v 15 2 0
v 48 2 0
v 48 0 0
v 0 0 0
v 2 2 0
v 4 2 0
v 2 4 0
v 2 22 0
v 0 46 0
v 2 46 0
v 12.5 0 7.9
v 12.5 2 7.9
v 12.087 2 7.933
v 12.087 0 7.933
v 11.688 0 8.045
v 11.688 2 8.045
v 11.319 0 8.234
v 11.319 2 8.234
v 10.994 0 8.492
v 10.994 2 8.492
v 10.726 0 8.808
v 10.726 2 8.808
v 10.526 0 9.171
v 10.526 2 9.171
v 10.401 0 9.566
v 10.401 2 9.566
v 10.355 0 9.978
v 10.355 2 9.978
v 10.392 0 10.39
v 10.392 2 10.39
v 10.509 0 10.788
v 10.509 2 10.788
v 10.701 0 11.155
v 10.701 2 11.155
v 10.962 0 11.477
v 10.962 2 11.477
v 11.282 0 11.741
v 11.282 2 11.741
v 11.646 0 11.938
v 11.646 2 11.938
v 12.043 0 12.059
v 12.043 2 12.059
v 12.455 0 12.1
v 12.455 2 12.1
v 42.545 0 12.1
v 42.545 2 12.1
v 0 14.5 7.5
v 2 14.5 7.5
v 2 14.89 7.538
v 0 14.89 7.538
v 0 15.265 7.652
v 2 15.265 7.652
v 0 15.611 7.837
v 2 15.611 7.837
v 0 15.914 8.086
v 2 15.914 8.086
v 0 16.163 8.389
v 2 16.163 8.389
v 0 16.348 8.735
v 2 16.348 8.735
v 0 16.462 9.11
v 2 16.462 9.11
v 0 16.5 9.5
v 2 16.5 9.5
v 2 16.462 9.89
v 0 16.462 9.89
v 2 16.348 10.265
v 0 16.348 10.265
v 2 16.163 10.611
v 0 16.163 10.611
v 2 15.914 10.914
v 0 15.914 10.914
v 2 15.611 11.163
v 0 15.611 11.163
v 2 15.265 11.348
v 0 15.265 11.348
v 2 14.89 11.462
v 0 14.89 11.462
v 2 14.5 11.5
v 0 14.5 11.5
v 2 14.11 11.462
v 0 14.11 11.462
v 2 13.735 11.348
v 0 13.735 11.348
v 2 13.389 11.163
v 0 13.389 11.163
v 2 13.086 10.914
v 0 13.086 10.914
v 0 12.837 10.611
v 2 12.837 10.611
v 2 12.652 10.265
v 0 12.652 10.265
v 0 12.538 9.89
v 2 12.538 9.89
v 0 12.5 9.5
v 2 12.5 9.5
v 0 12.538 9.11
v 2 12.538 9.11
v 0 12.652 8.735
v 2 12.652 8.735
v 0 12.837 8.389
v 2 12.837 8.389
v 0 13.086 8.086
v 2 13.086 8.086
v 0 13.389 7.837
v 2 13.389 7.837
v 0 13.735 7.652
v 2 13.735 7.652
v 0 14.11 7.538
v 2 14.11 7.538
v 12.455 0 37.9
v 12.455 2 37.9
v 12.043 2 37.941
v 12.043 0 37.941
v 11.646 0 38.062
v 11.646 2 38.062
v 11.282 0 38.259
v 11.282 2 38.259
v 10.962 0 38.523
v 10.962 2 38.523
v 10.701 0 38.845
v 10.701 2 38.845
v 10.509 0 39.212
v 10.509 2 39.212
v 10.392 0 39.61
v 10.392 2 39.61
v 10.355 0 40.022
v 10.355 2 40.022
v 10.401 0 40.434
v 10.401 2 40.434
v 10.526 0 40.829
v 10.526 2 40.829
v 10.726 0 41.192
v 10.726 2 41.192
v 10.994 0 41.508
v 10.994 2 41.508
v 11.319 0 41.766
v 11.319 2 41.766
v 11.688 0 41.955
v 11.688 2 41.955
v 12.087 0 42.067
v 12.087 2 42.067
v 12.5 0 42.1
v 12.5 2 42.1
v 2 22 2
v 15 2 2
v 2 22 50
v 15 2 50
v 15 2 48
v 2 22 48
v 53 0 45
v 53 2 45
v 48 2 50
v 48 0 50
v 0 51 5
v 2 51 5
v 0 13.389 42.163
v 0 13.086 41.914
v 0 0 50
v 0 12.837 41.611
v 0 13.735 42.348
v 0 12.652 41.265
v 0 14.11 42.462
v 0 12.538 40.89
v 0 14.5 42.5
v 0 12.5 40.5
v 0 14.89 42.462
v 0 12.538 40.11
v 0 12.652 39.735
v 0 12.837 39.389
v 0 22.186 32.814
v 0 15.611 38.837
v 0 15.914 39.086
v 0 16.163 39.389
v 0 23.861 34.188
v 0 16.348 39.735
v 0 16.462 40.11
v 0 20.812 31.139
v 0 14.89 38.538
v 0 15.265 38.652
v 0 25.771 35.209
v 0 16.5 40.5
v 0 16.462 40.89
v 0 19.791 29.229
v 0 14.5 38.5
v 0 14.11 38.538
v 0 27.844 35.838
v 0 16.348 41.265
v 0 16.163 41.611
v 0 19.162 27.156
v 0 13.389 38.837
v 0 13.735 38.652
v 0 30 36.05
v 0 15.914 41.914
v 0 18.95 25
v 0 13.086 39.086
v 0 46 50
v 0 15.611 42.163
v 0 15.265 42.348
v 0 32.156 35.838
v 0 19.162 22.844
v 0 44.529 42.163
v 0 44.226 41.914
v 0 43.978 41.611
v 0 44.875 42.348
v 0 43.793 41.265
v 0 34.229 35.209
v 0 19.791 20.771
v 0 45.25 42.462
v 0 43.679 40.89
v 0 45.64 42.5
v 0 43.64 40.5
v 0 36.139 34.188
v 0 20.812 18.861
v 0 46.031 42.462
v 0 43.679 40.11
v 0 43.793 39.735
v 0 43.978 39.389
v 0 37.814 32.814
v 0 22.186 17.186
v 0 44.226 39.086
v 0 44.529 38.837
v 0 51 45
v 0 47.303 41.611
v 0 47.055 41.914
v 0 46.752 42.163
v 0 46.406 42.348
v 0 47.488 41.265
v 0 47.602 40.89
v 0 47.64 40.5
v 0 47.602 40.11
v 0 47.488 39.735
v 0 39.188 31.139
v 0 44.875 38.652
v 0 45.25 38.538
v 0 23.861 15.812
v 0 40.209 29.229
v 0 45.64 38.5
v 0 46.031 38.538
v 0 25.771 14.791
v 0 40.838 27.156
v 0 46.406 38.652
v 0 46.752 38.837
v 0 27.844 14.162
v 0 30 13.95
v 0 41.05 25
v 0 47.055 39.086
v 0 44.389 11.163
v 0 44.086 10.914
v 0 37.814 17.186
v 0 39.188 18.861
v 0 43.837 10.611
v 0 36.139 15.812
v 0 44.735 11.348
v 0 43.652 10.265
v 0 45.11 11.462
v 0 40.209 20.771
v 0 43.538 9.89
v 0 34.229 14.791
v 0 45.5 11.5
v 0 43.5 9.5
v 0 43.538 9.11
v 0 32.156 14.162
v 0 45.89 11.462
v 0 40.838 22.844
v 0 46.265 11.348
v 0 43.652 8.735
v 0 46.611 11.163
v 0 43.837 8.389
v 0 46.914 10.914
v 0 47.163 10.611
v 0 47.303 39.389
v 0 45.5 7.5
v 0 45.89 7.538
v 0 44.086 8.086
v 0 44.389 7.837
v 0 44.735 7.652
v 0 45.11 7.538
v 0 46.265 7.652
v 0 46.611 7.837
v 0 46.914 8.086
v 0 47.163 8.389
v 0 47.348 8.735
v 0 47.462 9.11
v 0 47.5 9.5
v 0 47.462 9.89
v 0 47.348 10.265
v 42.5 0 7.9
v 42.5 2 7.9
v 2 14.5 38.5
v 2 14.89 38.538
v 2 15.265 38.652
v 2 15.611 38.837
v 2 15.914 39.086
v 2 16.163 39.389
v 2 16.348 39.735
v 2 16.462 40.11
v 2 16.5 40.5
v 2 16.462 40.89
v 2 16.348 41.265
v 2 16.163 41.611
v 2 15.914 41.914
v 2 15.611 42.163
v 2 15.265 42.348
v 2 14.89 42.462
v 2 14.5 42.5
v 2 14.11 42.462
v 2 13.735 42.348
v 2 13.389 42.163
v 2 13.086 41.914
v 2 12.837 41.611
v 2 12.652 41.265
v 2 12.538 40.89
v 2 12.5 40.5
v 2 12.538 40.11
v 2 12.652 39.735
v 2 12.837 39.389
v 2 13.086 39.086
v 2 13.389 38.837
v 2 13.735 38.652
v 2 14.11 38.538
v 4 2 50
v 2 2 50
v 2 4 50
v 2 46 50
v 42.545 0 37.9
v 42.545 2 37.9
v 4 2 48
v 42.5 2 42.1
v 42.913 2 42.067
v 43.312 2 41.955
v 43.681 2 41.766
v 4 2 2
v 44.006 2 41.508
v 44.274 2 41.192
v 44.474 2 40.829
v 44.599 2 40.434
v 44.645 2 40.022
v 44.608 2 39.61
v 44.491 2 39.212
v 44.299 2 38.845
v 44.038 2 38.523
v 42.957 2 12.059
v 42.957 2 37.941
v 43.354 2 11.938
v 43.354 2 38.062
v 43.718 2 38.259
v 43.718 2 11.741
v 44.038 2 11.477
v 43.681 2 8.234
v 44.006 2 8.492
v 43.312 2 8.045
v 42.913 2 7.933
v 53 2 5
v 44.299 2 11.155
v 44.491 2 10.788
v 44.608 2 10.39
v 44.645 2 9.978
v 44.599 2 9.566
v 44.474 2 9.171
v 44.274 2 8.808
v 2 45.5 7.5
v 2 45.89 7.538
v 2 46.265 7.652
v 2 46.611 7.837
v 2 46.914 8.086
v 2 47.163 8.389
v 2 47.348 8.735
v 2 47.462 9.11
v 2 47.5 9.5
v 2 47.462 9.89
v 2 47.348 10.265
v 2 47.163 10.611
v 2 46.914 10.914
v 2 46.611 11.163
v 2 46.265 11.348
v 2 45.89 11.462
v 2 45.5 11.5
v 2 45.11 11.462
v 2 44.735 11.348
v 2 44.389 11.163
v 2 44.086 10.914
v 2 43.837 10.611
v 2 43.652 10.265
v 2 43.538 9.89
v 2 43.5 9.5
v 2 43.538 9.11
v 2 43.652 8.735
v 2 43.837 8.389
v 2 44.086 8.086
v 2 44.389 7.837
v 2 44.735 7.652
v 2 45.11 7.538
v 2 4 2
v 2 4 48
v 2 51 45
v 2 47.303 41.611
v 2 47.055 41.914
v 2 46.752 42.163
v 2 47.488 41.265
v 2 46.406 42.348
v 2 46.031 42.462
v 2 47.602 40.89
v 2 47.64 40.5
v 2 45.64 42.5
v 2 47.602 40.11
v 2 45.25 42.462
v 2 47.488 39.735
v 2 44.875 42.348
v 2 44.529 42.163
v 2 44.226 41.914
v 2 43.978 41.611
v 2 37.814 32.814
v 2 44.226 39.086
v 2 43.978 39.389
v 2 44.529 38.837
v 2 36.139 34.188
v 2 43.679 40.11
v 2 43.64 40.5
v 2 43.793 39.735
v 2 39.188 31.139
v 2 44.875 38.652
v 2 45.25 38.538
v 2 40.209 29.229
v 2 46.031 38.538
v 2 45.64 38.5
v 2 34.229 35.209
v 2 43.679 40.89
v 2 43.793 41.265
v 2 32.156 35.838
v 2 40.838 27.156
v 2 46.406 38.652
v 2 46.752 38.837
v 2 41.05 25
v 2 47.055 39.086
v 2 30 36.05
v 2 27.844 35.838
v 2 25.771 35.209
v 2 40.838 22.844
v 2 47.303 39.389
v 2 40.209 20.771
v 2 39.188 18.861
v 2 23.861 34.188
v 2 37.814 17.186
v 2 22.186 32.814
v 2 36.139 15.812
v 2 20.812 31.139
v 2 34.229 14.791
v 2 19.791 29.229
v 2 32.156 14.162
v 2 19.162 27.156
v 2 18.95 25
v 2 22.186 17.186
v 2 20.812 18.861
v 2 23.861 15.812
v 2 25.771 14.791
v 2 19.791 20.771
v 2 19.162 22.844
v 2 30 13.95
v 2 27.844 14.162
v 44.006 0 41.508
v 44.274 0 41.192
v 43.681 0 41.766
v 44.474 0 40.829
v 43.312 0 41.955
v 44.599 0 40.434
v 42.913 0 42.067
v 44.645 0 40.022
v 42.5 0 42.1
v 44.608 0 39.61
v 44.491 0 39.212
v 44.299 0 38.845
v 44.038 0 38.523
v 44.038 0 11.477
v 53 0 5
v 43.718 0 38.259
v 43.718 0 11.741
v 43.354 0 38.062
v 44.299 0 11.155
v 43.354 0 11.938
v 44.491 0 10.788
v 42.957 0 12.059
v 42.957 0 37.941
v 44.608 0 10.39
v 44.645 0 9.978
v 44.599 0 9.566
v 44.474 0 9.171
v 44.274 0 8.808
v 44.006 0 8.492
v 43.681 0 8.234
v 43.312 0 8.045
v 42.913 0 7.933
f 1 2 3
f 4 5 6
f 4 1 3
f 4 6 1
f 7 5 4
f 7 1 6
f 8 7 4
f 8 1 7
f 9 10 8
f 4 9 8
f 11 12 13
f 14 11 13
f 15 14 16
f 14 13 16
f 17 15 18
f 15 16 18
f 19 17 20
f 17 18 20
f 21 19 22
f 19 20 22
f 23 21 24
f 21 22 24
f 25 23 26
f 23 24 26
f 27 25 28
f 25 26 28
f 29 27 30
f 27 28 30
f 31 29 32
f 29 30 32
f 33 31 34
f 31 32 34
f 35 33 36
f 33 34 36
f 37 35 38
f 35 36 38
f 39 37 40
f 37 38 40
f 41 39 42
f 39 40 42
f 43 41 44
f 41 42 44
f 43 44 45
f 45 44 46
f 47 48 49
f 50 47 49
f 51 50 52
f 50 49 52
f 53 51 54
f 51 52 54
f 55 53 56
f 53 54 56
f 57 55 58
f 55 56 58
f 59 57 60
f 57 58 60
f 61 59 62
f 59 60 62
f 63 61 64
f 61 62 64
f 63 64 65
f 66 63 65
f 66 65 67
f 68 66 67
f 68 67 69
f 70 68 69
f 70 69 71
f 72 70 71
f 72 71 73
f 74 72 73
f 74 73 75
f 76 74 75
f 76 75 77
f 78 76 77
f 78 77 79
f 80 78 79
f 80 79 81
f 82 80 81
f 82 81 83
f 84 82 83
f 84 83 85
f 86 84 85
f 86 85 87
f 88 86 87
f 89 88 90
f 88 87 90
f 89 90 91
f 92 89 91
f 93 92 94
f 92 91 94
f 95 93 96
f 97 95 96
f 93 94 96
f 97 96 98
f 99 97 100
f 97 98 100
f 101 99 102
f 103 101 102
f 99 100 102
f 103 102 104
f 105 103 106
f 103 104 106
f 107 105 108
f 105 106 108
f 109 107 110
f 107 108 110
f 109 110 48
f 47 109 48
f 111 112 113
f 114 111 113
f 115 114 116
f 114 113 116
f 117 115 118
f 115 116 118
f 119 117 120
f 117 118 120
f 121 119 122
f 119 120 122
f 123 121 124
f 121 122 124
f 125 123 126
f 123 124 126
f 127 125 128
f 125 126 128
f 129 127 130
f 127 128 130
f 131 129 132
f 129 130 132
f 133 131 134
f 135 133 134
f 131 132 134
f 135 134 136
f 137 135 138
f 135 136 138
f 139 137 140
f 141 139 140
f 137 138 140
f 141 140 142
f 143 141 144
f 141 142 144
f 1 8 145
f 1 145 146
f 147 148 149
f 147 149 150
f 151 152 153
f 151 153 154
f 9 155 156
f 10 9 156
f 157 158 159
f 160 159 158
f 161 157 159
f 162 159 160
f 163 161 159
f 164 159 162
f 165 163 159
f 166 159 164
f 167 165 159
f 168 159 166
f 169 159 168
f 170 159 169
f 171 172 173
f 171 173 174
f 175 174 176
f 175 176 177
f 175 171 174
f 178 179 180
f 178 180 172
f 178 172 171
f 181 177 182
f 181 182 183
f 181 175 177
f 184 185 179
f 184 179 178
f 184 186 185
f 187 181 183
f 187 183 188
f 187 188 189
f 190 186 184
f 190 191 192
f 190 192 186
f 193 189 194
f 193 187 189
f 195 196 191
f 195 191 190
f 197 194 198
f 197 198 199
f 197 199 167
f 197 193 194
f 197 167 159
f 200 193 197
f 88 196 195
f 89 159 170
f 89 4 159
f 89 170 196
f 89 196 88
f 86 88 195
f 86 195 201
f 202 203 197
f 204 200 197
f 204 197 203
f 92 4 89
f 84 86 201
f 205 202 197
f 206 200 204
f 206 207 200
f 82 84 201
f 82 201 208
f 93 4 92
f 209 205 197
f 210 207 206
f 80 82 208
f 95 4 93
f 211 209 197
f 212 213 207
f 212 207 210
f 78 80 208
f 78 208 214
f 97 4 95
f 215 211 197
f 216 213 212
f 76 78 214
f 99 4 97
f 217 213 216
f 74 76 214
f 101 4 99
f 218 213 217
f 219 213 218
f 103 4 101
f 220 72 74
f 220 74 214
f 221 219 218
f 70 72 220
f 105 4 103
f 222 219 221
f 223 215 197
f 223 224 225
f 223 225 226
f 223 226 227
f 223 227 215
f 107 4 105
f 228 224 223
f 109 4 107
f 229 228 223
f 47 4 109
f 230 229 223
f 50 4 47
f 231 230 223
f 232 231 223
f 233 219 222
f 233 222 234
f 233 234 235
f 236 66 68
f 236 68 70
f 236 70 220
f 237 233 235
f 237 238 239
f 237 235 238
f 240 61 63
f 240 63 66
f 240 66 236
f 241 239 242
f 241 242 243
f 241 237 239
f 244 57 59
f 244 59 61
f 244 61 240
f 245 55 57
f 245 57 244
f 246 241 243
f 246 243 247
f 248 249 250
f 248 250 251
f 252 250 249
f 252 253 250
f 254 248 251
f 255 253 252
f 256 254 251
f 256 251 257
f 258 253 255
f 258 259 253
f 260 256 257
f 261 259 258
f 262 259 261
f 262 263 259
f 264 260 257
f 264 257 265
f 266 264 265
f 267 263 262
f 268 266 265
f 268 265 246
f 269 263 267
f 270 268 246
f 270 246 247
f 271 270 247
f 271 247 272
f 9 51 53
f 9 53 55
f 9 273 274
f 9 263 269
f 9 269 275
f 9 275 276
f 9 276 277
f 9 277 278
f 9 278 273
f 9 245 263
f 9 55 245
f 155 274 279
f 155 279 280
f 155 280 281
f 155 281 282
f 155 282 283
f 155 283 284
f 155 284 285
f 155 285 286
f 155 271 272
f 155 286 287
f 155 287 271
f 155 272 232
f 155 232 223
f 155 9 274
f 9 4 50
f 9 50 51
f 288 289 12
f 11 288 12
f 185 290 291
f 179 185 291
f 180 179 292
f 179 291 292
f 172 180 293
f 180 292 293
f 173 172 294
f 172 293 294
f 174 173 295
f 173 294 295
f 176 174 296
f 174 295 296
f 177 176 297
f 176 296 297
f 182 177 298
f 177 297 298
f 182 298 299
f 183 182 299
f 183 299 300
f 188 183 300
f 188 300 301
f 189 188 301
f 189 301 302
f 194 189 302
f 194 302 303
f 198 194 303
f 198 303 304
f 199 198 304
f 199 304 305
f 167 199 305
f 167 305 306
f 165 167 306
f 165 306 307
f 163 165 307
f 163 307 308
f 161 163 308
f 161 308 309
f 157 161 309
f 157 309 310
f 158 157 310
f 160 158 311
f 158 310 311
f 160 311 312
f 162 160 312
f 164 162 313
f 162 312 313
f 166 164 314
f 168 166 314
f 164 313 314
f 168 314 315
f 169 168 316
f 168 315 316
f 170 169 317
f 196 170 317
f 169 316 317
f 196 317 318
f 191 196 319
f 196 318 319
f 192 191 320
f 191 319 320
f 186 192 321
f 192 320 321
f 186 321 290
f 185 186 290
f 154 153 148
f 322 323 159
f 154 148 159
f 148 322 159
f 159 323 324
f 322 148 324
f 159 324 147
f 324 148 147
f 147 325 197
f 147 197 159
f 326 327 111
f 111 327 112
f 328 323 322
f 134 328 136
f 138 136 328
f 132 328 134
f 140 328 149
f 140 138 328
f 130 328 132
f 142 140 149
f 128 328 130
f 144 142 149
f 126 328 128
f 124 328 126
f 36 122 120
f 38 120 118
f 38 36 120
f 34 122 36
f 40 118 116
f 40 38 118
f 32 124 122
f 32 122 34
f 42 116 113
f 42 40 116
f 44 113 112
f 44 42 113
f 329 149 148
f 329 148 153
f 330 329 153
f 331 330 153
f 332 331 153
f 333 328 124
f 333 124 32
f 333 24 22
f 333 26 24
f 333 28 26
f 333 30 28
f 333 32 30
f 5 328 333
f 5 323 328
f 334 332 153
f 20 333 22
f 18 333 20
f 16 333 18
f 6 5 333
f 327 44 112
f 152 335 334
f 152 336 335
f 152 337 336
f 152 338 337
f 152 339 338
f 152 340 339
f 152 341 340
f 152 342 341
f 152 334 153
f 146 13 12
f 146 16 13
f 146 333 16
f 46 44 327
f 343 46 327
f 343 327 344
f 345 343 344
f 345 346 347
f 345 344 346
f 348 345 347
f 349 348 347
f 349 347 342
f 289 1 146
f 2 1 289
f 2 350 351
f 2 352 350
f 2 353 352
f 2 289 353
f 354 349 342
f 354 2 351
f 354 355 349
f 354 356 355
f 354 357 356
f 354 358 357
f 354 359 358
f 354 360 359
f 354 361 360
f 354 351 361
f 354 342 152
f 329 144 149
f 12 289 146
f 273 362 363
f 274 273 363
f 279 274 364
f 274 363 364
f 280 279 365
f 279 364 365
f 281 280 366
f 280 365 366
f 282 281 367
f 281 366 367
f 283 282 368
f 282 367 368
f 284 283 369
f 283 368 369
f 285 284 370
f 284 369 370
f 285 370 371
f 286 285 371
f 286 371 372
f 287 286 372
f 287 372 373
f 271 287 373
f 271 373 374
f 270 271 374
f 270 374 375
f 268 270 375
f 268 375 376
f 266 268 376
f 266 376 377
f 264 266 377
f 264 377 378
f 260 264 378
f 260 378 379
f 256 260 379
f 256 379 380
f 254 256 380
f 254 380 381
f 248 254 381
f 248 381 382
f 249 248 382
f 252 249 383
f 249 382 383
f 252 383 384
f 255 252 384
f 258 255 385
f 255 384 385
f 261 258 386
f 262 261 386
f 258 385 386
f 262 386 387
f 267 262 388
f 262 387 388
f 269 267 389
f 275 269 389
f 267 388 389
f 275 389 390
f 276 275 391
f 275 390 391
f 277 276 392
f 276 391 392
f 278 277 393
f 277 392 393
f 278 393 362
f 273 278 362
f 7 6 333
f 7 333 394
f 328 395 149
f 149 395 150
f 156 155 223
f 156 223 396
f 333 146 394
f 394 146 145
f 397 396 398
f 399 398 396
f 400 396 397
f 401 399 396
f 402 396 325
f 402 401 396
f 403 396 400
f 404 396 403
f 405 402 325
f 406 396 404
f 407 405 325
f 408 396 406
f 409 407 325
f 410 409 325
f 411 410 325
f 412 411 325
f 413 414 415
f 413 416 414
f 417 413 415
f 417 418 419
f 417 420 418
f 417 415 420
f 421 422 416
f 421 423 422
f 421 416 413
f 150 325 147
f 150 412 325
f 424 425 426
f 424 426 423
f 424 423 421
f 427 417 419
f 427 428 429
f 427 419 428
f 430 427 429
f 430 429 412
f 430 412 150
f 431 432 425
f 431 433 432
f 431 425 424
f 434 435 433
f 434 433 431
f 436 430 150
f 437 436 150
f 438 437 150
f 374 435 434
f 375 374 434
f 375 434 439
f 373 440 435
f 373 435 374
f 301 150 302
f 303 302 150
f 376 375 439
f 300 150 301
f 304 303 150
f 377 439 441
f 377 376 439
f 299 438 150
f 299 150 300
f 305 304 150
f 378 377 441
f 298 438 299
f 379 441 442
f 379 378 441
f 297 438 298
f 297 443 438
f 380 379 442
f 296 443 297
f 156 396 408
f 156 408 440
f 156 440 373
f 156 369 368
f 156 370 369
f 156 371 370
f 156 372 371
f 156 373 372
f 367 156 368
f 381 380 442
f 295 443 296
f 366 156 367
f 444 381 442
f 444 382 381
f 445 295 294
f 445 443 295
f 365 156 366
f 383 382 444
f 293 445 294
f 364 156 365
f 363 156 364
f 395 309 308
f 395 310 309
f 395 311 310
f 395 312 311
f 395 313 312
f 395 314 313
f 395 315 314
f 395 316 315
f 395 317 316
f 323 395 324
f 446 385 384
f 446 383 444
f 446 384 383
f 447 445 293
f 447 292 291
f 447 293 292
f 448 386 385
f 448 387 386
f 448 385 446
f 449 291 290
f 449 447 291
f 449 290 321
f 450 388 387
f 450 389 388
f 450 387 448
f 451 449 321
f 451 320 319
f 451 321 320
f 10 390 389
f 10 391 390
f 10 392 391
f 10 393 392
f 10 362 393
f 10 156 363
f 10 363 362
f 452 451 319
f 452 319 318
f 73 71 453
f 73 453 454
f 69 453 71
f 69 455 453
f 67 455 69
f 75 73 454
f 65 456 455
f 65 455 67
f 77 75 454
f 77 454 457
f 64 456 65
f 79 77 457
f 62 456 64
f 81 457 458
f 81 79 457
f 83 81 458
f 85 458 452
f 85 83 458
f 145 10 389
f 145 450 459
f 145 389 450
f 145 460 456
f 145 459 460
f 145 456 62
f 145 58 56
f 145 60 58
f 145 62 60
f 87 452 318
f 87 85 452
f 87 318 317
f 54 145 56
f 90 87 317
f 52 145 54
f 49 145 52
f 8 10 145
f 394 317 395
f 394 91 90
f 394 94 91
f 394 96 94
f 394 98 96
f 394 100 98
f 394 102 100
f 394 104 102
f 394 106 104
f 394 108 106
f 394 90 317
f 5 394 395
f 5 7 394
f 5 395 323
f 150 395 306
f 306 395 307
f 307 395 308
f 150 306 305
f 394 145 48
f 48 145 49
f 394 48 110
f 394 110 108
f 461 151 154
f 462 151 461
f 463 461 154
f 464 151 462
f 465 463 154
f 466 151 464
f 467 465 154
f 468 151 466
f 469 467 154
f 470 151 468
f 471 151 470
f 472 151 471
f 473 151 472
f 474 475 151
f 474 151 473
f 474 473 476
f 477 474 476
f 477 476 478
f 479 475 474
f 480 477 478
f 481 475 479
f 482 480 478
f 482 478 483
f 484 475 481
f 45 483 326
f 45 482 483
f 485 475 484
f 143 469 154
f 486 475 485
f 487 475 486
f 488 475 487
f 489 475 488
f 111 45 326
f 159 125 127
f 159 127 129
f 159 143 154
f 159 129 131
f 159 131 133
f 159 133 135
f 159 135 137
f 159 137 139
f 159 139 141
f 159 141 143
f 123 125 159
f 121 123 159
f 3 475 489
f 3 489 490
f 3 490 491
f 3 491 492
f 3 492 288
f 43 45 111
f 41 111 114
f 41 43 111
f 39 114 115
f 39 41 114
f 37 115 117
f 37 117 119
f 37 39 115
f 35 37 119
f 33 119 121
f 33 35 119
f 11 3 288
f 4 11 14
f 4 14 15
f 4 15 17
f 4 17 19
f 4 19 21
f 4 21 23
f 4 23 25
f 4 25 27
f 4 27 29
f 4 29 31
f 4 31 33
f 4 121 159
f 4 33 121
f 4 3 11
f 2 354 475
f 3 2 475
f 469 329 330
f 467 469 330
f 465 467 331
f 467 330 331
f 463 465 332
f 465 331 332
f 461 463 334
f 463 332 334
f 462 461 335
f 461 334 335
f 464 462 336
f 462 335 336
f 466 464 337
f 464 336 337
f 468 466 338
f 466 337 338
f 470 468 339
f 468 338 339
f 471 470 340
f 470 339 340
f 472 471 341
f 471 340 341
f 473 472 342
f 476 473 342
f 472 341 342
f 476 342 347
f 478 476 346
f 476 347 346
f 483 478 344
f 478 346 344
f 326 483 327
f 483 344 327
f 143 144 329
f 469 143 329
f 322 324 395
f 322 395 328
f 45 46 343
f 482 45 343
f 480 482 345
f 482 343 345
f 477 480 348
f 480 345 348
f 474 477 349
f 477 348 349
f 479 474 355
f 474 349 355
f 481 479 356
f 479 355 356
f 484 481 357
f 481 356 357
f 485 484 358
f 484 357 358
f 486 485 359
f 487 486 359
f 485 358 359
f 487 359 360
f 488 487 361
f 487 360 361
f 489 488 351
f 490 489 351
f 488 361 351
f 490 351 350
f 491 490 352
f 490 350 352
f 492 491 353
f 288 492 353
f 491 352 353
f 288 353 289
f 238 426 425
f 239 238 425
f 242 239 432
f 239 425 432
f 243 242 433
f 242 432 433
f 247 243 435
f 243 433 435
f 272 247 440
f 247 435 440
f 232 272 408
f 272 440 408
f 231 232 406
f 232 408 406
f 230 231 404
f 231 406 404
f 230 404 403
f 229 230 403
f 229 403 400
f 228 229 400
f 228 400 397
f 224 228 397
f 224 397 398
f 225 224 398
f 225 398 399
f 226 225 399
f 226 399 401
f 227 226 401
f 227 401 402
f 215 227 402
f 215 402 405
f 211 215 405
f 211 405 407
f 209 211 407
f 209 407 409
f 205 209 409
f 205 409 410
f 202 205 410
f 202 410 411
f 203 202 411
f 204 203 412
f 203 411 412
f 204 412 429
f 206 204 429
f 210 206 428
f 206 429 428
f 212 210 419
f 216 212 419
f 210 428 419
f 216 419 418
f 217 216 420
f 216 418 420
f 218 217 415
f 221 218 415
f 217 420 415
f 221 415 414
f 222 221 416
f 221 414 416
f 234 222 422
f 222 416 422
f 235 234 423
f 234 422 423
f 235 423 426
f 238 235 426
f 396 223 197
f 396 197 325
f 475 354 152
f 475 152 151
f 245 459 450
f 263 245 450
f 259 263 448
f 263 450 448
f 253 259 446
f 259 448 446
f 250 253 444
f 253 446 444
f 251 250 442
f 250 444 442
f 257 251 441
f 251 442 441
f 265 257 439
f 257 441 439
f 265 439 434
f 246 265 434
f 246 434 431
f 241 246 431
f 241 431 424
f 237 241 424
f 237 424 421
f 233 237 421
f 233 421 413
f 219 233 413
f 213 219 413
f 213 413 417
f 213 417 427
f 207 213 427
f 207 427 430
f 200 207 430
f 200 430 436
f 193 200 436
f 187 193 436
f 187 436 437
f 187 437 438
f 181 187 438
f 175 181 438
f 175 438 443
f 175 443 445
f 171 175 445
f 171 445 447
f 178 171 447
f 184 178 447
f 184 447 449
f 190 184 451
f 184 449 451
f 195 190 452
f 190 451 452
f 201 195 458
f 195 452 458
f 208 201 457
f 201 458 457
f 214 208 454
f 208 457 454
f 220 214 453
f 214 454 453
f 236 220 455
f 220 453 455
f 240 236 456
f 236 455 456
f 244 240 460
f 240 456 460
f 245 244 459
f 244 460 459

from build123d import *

# Parameters (mm, degrees)
BOSS_EXTRUDE1_DEPTH = 50
SKETCH2_R           = 11.05
SKETCH2_R_2         = 2
CUT_EXTRUDE1_DEPTH  = 3
CUT_EXTRUDE2_DEPTH  = 50
BOSS_EXTRUDE2_DEPTH = 2
BOSS_EXTRUDE3_DEPTH = 2
CHAMFER1_SIZE       = 5


with BuildPart() as part:
    # Sketch1 → Boss-Extrude1 (new body)
    with BuildSketch(Plane.XY):
        Polygon((0, 0), (0, 51), (2, 51), (2, 2), (53, 2), (53, 0), align=None)
    extrude(amount=BOSS_EXTRUDE1_DEPTH)

    # Sketch2 → Cut-Extrude1 (cut, through all)
    with BuildSketch(Plane(origin=(2, 0, 0), x_dir=(0, 0, -1), z_dir=(1, 0, 0))):
        with Locations((-25, 30)):
            Circle(SKETCH2_R)
        with Locations((-40.5, 45.640445987)):
            Circle(SKETCH2_R_2)
        with Locations((-9.5, 45.5)):
            Circle(SKETCH2_R_2)
        with Locations((-40.5, 14.5)):
            Circle(SKETCH2_R_2)
        with Locations((-9.5, 14.5)):
            Circle(SKETCH2_R_2)
    extrude(amount=-CUT_EXTRUDE1_DEPTH, mode=Mode.SUBTRACT)

    # Sketch3 → Cut-Extrude2 (cut)
    with BuildSketch(Plane(origin=(0, 2, 0), x_dir=(1, 0, 0), z_dir=(0, 1, 0))):
        with BuildLine():
            Line((12.455251015, -12.1), (42.544748985, -12.1))
            ThreePointArc((42.544748985, -12.1), (44.644629774, -9.977624237), (42.5, -7.900476833))
            Line((42.5, -7.900476833), (12.5, -7.900476833))
            ThreePointArc((12.5, -7.900476833), (10.355370226, -9.977624237), (12.455251015, -12.1))
        make_face()
        with BuildLine():
            Line((12.5, -42.099523167), (42.5, -42.099523167))
            ThreePointArc((42.5, -42.099523167), (44.644629774, -40.022375763), (42.544748985, -37.9))
            Line((42.544748985, -37.9), (12.455251015, -37.9))
            ThreePointArc((12.455251015, -37.9), (10.355370226, -40.022375763), (12.5, -42.099523167))
        make_face()
    extrude(amount=-CUT_EXTRUDE2_DEPTH, mode=Mode.SUBTRACT)

    # Sketch5 → Boss-Extrude2 (add)
    with BuildSketch(Plane.XY.offset(50)):
        Polygon((2, 22), (2, 4), (4, 2), (15, 2), align=None)
    extrude(amount=-BOSS_EXTRUDE2_DEPTH)

    # Sketch6 → Boss-Extrude3 (add)
    with BuildSketch(Plane(origin=(0, 0, 0), x_dir=(-1, 0, 0), z_dir=(0, 0, -1))):
        Polygon((-4, 2), (-2, 4), (-2, 22), (-15, 2), align=None)
    extrude(amount=-BOSS_EXTRUDE3_DEPTH)

    # Chamfer1
    chamfer1_edges = [part.edges().sort_by_distance(p)[0] for p in [
        (1, 51, 50),
        (1, 51, 0),
        (53, 1, 50),
        (53, 1, 0),
    ]]
    chamfer(chamfer1_edges, length=CHAMFER1_SIZE)


solid = part.part
